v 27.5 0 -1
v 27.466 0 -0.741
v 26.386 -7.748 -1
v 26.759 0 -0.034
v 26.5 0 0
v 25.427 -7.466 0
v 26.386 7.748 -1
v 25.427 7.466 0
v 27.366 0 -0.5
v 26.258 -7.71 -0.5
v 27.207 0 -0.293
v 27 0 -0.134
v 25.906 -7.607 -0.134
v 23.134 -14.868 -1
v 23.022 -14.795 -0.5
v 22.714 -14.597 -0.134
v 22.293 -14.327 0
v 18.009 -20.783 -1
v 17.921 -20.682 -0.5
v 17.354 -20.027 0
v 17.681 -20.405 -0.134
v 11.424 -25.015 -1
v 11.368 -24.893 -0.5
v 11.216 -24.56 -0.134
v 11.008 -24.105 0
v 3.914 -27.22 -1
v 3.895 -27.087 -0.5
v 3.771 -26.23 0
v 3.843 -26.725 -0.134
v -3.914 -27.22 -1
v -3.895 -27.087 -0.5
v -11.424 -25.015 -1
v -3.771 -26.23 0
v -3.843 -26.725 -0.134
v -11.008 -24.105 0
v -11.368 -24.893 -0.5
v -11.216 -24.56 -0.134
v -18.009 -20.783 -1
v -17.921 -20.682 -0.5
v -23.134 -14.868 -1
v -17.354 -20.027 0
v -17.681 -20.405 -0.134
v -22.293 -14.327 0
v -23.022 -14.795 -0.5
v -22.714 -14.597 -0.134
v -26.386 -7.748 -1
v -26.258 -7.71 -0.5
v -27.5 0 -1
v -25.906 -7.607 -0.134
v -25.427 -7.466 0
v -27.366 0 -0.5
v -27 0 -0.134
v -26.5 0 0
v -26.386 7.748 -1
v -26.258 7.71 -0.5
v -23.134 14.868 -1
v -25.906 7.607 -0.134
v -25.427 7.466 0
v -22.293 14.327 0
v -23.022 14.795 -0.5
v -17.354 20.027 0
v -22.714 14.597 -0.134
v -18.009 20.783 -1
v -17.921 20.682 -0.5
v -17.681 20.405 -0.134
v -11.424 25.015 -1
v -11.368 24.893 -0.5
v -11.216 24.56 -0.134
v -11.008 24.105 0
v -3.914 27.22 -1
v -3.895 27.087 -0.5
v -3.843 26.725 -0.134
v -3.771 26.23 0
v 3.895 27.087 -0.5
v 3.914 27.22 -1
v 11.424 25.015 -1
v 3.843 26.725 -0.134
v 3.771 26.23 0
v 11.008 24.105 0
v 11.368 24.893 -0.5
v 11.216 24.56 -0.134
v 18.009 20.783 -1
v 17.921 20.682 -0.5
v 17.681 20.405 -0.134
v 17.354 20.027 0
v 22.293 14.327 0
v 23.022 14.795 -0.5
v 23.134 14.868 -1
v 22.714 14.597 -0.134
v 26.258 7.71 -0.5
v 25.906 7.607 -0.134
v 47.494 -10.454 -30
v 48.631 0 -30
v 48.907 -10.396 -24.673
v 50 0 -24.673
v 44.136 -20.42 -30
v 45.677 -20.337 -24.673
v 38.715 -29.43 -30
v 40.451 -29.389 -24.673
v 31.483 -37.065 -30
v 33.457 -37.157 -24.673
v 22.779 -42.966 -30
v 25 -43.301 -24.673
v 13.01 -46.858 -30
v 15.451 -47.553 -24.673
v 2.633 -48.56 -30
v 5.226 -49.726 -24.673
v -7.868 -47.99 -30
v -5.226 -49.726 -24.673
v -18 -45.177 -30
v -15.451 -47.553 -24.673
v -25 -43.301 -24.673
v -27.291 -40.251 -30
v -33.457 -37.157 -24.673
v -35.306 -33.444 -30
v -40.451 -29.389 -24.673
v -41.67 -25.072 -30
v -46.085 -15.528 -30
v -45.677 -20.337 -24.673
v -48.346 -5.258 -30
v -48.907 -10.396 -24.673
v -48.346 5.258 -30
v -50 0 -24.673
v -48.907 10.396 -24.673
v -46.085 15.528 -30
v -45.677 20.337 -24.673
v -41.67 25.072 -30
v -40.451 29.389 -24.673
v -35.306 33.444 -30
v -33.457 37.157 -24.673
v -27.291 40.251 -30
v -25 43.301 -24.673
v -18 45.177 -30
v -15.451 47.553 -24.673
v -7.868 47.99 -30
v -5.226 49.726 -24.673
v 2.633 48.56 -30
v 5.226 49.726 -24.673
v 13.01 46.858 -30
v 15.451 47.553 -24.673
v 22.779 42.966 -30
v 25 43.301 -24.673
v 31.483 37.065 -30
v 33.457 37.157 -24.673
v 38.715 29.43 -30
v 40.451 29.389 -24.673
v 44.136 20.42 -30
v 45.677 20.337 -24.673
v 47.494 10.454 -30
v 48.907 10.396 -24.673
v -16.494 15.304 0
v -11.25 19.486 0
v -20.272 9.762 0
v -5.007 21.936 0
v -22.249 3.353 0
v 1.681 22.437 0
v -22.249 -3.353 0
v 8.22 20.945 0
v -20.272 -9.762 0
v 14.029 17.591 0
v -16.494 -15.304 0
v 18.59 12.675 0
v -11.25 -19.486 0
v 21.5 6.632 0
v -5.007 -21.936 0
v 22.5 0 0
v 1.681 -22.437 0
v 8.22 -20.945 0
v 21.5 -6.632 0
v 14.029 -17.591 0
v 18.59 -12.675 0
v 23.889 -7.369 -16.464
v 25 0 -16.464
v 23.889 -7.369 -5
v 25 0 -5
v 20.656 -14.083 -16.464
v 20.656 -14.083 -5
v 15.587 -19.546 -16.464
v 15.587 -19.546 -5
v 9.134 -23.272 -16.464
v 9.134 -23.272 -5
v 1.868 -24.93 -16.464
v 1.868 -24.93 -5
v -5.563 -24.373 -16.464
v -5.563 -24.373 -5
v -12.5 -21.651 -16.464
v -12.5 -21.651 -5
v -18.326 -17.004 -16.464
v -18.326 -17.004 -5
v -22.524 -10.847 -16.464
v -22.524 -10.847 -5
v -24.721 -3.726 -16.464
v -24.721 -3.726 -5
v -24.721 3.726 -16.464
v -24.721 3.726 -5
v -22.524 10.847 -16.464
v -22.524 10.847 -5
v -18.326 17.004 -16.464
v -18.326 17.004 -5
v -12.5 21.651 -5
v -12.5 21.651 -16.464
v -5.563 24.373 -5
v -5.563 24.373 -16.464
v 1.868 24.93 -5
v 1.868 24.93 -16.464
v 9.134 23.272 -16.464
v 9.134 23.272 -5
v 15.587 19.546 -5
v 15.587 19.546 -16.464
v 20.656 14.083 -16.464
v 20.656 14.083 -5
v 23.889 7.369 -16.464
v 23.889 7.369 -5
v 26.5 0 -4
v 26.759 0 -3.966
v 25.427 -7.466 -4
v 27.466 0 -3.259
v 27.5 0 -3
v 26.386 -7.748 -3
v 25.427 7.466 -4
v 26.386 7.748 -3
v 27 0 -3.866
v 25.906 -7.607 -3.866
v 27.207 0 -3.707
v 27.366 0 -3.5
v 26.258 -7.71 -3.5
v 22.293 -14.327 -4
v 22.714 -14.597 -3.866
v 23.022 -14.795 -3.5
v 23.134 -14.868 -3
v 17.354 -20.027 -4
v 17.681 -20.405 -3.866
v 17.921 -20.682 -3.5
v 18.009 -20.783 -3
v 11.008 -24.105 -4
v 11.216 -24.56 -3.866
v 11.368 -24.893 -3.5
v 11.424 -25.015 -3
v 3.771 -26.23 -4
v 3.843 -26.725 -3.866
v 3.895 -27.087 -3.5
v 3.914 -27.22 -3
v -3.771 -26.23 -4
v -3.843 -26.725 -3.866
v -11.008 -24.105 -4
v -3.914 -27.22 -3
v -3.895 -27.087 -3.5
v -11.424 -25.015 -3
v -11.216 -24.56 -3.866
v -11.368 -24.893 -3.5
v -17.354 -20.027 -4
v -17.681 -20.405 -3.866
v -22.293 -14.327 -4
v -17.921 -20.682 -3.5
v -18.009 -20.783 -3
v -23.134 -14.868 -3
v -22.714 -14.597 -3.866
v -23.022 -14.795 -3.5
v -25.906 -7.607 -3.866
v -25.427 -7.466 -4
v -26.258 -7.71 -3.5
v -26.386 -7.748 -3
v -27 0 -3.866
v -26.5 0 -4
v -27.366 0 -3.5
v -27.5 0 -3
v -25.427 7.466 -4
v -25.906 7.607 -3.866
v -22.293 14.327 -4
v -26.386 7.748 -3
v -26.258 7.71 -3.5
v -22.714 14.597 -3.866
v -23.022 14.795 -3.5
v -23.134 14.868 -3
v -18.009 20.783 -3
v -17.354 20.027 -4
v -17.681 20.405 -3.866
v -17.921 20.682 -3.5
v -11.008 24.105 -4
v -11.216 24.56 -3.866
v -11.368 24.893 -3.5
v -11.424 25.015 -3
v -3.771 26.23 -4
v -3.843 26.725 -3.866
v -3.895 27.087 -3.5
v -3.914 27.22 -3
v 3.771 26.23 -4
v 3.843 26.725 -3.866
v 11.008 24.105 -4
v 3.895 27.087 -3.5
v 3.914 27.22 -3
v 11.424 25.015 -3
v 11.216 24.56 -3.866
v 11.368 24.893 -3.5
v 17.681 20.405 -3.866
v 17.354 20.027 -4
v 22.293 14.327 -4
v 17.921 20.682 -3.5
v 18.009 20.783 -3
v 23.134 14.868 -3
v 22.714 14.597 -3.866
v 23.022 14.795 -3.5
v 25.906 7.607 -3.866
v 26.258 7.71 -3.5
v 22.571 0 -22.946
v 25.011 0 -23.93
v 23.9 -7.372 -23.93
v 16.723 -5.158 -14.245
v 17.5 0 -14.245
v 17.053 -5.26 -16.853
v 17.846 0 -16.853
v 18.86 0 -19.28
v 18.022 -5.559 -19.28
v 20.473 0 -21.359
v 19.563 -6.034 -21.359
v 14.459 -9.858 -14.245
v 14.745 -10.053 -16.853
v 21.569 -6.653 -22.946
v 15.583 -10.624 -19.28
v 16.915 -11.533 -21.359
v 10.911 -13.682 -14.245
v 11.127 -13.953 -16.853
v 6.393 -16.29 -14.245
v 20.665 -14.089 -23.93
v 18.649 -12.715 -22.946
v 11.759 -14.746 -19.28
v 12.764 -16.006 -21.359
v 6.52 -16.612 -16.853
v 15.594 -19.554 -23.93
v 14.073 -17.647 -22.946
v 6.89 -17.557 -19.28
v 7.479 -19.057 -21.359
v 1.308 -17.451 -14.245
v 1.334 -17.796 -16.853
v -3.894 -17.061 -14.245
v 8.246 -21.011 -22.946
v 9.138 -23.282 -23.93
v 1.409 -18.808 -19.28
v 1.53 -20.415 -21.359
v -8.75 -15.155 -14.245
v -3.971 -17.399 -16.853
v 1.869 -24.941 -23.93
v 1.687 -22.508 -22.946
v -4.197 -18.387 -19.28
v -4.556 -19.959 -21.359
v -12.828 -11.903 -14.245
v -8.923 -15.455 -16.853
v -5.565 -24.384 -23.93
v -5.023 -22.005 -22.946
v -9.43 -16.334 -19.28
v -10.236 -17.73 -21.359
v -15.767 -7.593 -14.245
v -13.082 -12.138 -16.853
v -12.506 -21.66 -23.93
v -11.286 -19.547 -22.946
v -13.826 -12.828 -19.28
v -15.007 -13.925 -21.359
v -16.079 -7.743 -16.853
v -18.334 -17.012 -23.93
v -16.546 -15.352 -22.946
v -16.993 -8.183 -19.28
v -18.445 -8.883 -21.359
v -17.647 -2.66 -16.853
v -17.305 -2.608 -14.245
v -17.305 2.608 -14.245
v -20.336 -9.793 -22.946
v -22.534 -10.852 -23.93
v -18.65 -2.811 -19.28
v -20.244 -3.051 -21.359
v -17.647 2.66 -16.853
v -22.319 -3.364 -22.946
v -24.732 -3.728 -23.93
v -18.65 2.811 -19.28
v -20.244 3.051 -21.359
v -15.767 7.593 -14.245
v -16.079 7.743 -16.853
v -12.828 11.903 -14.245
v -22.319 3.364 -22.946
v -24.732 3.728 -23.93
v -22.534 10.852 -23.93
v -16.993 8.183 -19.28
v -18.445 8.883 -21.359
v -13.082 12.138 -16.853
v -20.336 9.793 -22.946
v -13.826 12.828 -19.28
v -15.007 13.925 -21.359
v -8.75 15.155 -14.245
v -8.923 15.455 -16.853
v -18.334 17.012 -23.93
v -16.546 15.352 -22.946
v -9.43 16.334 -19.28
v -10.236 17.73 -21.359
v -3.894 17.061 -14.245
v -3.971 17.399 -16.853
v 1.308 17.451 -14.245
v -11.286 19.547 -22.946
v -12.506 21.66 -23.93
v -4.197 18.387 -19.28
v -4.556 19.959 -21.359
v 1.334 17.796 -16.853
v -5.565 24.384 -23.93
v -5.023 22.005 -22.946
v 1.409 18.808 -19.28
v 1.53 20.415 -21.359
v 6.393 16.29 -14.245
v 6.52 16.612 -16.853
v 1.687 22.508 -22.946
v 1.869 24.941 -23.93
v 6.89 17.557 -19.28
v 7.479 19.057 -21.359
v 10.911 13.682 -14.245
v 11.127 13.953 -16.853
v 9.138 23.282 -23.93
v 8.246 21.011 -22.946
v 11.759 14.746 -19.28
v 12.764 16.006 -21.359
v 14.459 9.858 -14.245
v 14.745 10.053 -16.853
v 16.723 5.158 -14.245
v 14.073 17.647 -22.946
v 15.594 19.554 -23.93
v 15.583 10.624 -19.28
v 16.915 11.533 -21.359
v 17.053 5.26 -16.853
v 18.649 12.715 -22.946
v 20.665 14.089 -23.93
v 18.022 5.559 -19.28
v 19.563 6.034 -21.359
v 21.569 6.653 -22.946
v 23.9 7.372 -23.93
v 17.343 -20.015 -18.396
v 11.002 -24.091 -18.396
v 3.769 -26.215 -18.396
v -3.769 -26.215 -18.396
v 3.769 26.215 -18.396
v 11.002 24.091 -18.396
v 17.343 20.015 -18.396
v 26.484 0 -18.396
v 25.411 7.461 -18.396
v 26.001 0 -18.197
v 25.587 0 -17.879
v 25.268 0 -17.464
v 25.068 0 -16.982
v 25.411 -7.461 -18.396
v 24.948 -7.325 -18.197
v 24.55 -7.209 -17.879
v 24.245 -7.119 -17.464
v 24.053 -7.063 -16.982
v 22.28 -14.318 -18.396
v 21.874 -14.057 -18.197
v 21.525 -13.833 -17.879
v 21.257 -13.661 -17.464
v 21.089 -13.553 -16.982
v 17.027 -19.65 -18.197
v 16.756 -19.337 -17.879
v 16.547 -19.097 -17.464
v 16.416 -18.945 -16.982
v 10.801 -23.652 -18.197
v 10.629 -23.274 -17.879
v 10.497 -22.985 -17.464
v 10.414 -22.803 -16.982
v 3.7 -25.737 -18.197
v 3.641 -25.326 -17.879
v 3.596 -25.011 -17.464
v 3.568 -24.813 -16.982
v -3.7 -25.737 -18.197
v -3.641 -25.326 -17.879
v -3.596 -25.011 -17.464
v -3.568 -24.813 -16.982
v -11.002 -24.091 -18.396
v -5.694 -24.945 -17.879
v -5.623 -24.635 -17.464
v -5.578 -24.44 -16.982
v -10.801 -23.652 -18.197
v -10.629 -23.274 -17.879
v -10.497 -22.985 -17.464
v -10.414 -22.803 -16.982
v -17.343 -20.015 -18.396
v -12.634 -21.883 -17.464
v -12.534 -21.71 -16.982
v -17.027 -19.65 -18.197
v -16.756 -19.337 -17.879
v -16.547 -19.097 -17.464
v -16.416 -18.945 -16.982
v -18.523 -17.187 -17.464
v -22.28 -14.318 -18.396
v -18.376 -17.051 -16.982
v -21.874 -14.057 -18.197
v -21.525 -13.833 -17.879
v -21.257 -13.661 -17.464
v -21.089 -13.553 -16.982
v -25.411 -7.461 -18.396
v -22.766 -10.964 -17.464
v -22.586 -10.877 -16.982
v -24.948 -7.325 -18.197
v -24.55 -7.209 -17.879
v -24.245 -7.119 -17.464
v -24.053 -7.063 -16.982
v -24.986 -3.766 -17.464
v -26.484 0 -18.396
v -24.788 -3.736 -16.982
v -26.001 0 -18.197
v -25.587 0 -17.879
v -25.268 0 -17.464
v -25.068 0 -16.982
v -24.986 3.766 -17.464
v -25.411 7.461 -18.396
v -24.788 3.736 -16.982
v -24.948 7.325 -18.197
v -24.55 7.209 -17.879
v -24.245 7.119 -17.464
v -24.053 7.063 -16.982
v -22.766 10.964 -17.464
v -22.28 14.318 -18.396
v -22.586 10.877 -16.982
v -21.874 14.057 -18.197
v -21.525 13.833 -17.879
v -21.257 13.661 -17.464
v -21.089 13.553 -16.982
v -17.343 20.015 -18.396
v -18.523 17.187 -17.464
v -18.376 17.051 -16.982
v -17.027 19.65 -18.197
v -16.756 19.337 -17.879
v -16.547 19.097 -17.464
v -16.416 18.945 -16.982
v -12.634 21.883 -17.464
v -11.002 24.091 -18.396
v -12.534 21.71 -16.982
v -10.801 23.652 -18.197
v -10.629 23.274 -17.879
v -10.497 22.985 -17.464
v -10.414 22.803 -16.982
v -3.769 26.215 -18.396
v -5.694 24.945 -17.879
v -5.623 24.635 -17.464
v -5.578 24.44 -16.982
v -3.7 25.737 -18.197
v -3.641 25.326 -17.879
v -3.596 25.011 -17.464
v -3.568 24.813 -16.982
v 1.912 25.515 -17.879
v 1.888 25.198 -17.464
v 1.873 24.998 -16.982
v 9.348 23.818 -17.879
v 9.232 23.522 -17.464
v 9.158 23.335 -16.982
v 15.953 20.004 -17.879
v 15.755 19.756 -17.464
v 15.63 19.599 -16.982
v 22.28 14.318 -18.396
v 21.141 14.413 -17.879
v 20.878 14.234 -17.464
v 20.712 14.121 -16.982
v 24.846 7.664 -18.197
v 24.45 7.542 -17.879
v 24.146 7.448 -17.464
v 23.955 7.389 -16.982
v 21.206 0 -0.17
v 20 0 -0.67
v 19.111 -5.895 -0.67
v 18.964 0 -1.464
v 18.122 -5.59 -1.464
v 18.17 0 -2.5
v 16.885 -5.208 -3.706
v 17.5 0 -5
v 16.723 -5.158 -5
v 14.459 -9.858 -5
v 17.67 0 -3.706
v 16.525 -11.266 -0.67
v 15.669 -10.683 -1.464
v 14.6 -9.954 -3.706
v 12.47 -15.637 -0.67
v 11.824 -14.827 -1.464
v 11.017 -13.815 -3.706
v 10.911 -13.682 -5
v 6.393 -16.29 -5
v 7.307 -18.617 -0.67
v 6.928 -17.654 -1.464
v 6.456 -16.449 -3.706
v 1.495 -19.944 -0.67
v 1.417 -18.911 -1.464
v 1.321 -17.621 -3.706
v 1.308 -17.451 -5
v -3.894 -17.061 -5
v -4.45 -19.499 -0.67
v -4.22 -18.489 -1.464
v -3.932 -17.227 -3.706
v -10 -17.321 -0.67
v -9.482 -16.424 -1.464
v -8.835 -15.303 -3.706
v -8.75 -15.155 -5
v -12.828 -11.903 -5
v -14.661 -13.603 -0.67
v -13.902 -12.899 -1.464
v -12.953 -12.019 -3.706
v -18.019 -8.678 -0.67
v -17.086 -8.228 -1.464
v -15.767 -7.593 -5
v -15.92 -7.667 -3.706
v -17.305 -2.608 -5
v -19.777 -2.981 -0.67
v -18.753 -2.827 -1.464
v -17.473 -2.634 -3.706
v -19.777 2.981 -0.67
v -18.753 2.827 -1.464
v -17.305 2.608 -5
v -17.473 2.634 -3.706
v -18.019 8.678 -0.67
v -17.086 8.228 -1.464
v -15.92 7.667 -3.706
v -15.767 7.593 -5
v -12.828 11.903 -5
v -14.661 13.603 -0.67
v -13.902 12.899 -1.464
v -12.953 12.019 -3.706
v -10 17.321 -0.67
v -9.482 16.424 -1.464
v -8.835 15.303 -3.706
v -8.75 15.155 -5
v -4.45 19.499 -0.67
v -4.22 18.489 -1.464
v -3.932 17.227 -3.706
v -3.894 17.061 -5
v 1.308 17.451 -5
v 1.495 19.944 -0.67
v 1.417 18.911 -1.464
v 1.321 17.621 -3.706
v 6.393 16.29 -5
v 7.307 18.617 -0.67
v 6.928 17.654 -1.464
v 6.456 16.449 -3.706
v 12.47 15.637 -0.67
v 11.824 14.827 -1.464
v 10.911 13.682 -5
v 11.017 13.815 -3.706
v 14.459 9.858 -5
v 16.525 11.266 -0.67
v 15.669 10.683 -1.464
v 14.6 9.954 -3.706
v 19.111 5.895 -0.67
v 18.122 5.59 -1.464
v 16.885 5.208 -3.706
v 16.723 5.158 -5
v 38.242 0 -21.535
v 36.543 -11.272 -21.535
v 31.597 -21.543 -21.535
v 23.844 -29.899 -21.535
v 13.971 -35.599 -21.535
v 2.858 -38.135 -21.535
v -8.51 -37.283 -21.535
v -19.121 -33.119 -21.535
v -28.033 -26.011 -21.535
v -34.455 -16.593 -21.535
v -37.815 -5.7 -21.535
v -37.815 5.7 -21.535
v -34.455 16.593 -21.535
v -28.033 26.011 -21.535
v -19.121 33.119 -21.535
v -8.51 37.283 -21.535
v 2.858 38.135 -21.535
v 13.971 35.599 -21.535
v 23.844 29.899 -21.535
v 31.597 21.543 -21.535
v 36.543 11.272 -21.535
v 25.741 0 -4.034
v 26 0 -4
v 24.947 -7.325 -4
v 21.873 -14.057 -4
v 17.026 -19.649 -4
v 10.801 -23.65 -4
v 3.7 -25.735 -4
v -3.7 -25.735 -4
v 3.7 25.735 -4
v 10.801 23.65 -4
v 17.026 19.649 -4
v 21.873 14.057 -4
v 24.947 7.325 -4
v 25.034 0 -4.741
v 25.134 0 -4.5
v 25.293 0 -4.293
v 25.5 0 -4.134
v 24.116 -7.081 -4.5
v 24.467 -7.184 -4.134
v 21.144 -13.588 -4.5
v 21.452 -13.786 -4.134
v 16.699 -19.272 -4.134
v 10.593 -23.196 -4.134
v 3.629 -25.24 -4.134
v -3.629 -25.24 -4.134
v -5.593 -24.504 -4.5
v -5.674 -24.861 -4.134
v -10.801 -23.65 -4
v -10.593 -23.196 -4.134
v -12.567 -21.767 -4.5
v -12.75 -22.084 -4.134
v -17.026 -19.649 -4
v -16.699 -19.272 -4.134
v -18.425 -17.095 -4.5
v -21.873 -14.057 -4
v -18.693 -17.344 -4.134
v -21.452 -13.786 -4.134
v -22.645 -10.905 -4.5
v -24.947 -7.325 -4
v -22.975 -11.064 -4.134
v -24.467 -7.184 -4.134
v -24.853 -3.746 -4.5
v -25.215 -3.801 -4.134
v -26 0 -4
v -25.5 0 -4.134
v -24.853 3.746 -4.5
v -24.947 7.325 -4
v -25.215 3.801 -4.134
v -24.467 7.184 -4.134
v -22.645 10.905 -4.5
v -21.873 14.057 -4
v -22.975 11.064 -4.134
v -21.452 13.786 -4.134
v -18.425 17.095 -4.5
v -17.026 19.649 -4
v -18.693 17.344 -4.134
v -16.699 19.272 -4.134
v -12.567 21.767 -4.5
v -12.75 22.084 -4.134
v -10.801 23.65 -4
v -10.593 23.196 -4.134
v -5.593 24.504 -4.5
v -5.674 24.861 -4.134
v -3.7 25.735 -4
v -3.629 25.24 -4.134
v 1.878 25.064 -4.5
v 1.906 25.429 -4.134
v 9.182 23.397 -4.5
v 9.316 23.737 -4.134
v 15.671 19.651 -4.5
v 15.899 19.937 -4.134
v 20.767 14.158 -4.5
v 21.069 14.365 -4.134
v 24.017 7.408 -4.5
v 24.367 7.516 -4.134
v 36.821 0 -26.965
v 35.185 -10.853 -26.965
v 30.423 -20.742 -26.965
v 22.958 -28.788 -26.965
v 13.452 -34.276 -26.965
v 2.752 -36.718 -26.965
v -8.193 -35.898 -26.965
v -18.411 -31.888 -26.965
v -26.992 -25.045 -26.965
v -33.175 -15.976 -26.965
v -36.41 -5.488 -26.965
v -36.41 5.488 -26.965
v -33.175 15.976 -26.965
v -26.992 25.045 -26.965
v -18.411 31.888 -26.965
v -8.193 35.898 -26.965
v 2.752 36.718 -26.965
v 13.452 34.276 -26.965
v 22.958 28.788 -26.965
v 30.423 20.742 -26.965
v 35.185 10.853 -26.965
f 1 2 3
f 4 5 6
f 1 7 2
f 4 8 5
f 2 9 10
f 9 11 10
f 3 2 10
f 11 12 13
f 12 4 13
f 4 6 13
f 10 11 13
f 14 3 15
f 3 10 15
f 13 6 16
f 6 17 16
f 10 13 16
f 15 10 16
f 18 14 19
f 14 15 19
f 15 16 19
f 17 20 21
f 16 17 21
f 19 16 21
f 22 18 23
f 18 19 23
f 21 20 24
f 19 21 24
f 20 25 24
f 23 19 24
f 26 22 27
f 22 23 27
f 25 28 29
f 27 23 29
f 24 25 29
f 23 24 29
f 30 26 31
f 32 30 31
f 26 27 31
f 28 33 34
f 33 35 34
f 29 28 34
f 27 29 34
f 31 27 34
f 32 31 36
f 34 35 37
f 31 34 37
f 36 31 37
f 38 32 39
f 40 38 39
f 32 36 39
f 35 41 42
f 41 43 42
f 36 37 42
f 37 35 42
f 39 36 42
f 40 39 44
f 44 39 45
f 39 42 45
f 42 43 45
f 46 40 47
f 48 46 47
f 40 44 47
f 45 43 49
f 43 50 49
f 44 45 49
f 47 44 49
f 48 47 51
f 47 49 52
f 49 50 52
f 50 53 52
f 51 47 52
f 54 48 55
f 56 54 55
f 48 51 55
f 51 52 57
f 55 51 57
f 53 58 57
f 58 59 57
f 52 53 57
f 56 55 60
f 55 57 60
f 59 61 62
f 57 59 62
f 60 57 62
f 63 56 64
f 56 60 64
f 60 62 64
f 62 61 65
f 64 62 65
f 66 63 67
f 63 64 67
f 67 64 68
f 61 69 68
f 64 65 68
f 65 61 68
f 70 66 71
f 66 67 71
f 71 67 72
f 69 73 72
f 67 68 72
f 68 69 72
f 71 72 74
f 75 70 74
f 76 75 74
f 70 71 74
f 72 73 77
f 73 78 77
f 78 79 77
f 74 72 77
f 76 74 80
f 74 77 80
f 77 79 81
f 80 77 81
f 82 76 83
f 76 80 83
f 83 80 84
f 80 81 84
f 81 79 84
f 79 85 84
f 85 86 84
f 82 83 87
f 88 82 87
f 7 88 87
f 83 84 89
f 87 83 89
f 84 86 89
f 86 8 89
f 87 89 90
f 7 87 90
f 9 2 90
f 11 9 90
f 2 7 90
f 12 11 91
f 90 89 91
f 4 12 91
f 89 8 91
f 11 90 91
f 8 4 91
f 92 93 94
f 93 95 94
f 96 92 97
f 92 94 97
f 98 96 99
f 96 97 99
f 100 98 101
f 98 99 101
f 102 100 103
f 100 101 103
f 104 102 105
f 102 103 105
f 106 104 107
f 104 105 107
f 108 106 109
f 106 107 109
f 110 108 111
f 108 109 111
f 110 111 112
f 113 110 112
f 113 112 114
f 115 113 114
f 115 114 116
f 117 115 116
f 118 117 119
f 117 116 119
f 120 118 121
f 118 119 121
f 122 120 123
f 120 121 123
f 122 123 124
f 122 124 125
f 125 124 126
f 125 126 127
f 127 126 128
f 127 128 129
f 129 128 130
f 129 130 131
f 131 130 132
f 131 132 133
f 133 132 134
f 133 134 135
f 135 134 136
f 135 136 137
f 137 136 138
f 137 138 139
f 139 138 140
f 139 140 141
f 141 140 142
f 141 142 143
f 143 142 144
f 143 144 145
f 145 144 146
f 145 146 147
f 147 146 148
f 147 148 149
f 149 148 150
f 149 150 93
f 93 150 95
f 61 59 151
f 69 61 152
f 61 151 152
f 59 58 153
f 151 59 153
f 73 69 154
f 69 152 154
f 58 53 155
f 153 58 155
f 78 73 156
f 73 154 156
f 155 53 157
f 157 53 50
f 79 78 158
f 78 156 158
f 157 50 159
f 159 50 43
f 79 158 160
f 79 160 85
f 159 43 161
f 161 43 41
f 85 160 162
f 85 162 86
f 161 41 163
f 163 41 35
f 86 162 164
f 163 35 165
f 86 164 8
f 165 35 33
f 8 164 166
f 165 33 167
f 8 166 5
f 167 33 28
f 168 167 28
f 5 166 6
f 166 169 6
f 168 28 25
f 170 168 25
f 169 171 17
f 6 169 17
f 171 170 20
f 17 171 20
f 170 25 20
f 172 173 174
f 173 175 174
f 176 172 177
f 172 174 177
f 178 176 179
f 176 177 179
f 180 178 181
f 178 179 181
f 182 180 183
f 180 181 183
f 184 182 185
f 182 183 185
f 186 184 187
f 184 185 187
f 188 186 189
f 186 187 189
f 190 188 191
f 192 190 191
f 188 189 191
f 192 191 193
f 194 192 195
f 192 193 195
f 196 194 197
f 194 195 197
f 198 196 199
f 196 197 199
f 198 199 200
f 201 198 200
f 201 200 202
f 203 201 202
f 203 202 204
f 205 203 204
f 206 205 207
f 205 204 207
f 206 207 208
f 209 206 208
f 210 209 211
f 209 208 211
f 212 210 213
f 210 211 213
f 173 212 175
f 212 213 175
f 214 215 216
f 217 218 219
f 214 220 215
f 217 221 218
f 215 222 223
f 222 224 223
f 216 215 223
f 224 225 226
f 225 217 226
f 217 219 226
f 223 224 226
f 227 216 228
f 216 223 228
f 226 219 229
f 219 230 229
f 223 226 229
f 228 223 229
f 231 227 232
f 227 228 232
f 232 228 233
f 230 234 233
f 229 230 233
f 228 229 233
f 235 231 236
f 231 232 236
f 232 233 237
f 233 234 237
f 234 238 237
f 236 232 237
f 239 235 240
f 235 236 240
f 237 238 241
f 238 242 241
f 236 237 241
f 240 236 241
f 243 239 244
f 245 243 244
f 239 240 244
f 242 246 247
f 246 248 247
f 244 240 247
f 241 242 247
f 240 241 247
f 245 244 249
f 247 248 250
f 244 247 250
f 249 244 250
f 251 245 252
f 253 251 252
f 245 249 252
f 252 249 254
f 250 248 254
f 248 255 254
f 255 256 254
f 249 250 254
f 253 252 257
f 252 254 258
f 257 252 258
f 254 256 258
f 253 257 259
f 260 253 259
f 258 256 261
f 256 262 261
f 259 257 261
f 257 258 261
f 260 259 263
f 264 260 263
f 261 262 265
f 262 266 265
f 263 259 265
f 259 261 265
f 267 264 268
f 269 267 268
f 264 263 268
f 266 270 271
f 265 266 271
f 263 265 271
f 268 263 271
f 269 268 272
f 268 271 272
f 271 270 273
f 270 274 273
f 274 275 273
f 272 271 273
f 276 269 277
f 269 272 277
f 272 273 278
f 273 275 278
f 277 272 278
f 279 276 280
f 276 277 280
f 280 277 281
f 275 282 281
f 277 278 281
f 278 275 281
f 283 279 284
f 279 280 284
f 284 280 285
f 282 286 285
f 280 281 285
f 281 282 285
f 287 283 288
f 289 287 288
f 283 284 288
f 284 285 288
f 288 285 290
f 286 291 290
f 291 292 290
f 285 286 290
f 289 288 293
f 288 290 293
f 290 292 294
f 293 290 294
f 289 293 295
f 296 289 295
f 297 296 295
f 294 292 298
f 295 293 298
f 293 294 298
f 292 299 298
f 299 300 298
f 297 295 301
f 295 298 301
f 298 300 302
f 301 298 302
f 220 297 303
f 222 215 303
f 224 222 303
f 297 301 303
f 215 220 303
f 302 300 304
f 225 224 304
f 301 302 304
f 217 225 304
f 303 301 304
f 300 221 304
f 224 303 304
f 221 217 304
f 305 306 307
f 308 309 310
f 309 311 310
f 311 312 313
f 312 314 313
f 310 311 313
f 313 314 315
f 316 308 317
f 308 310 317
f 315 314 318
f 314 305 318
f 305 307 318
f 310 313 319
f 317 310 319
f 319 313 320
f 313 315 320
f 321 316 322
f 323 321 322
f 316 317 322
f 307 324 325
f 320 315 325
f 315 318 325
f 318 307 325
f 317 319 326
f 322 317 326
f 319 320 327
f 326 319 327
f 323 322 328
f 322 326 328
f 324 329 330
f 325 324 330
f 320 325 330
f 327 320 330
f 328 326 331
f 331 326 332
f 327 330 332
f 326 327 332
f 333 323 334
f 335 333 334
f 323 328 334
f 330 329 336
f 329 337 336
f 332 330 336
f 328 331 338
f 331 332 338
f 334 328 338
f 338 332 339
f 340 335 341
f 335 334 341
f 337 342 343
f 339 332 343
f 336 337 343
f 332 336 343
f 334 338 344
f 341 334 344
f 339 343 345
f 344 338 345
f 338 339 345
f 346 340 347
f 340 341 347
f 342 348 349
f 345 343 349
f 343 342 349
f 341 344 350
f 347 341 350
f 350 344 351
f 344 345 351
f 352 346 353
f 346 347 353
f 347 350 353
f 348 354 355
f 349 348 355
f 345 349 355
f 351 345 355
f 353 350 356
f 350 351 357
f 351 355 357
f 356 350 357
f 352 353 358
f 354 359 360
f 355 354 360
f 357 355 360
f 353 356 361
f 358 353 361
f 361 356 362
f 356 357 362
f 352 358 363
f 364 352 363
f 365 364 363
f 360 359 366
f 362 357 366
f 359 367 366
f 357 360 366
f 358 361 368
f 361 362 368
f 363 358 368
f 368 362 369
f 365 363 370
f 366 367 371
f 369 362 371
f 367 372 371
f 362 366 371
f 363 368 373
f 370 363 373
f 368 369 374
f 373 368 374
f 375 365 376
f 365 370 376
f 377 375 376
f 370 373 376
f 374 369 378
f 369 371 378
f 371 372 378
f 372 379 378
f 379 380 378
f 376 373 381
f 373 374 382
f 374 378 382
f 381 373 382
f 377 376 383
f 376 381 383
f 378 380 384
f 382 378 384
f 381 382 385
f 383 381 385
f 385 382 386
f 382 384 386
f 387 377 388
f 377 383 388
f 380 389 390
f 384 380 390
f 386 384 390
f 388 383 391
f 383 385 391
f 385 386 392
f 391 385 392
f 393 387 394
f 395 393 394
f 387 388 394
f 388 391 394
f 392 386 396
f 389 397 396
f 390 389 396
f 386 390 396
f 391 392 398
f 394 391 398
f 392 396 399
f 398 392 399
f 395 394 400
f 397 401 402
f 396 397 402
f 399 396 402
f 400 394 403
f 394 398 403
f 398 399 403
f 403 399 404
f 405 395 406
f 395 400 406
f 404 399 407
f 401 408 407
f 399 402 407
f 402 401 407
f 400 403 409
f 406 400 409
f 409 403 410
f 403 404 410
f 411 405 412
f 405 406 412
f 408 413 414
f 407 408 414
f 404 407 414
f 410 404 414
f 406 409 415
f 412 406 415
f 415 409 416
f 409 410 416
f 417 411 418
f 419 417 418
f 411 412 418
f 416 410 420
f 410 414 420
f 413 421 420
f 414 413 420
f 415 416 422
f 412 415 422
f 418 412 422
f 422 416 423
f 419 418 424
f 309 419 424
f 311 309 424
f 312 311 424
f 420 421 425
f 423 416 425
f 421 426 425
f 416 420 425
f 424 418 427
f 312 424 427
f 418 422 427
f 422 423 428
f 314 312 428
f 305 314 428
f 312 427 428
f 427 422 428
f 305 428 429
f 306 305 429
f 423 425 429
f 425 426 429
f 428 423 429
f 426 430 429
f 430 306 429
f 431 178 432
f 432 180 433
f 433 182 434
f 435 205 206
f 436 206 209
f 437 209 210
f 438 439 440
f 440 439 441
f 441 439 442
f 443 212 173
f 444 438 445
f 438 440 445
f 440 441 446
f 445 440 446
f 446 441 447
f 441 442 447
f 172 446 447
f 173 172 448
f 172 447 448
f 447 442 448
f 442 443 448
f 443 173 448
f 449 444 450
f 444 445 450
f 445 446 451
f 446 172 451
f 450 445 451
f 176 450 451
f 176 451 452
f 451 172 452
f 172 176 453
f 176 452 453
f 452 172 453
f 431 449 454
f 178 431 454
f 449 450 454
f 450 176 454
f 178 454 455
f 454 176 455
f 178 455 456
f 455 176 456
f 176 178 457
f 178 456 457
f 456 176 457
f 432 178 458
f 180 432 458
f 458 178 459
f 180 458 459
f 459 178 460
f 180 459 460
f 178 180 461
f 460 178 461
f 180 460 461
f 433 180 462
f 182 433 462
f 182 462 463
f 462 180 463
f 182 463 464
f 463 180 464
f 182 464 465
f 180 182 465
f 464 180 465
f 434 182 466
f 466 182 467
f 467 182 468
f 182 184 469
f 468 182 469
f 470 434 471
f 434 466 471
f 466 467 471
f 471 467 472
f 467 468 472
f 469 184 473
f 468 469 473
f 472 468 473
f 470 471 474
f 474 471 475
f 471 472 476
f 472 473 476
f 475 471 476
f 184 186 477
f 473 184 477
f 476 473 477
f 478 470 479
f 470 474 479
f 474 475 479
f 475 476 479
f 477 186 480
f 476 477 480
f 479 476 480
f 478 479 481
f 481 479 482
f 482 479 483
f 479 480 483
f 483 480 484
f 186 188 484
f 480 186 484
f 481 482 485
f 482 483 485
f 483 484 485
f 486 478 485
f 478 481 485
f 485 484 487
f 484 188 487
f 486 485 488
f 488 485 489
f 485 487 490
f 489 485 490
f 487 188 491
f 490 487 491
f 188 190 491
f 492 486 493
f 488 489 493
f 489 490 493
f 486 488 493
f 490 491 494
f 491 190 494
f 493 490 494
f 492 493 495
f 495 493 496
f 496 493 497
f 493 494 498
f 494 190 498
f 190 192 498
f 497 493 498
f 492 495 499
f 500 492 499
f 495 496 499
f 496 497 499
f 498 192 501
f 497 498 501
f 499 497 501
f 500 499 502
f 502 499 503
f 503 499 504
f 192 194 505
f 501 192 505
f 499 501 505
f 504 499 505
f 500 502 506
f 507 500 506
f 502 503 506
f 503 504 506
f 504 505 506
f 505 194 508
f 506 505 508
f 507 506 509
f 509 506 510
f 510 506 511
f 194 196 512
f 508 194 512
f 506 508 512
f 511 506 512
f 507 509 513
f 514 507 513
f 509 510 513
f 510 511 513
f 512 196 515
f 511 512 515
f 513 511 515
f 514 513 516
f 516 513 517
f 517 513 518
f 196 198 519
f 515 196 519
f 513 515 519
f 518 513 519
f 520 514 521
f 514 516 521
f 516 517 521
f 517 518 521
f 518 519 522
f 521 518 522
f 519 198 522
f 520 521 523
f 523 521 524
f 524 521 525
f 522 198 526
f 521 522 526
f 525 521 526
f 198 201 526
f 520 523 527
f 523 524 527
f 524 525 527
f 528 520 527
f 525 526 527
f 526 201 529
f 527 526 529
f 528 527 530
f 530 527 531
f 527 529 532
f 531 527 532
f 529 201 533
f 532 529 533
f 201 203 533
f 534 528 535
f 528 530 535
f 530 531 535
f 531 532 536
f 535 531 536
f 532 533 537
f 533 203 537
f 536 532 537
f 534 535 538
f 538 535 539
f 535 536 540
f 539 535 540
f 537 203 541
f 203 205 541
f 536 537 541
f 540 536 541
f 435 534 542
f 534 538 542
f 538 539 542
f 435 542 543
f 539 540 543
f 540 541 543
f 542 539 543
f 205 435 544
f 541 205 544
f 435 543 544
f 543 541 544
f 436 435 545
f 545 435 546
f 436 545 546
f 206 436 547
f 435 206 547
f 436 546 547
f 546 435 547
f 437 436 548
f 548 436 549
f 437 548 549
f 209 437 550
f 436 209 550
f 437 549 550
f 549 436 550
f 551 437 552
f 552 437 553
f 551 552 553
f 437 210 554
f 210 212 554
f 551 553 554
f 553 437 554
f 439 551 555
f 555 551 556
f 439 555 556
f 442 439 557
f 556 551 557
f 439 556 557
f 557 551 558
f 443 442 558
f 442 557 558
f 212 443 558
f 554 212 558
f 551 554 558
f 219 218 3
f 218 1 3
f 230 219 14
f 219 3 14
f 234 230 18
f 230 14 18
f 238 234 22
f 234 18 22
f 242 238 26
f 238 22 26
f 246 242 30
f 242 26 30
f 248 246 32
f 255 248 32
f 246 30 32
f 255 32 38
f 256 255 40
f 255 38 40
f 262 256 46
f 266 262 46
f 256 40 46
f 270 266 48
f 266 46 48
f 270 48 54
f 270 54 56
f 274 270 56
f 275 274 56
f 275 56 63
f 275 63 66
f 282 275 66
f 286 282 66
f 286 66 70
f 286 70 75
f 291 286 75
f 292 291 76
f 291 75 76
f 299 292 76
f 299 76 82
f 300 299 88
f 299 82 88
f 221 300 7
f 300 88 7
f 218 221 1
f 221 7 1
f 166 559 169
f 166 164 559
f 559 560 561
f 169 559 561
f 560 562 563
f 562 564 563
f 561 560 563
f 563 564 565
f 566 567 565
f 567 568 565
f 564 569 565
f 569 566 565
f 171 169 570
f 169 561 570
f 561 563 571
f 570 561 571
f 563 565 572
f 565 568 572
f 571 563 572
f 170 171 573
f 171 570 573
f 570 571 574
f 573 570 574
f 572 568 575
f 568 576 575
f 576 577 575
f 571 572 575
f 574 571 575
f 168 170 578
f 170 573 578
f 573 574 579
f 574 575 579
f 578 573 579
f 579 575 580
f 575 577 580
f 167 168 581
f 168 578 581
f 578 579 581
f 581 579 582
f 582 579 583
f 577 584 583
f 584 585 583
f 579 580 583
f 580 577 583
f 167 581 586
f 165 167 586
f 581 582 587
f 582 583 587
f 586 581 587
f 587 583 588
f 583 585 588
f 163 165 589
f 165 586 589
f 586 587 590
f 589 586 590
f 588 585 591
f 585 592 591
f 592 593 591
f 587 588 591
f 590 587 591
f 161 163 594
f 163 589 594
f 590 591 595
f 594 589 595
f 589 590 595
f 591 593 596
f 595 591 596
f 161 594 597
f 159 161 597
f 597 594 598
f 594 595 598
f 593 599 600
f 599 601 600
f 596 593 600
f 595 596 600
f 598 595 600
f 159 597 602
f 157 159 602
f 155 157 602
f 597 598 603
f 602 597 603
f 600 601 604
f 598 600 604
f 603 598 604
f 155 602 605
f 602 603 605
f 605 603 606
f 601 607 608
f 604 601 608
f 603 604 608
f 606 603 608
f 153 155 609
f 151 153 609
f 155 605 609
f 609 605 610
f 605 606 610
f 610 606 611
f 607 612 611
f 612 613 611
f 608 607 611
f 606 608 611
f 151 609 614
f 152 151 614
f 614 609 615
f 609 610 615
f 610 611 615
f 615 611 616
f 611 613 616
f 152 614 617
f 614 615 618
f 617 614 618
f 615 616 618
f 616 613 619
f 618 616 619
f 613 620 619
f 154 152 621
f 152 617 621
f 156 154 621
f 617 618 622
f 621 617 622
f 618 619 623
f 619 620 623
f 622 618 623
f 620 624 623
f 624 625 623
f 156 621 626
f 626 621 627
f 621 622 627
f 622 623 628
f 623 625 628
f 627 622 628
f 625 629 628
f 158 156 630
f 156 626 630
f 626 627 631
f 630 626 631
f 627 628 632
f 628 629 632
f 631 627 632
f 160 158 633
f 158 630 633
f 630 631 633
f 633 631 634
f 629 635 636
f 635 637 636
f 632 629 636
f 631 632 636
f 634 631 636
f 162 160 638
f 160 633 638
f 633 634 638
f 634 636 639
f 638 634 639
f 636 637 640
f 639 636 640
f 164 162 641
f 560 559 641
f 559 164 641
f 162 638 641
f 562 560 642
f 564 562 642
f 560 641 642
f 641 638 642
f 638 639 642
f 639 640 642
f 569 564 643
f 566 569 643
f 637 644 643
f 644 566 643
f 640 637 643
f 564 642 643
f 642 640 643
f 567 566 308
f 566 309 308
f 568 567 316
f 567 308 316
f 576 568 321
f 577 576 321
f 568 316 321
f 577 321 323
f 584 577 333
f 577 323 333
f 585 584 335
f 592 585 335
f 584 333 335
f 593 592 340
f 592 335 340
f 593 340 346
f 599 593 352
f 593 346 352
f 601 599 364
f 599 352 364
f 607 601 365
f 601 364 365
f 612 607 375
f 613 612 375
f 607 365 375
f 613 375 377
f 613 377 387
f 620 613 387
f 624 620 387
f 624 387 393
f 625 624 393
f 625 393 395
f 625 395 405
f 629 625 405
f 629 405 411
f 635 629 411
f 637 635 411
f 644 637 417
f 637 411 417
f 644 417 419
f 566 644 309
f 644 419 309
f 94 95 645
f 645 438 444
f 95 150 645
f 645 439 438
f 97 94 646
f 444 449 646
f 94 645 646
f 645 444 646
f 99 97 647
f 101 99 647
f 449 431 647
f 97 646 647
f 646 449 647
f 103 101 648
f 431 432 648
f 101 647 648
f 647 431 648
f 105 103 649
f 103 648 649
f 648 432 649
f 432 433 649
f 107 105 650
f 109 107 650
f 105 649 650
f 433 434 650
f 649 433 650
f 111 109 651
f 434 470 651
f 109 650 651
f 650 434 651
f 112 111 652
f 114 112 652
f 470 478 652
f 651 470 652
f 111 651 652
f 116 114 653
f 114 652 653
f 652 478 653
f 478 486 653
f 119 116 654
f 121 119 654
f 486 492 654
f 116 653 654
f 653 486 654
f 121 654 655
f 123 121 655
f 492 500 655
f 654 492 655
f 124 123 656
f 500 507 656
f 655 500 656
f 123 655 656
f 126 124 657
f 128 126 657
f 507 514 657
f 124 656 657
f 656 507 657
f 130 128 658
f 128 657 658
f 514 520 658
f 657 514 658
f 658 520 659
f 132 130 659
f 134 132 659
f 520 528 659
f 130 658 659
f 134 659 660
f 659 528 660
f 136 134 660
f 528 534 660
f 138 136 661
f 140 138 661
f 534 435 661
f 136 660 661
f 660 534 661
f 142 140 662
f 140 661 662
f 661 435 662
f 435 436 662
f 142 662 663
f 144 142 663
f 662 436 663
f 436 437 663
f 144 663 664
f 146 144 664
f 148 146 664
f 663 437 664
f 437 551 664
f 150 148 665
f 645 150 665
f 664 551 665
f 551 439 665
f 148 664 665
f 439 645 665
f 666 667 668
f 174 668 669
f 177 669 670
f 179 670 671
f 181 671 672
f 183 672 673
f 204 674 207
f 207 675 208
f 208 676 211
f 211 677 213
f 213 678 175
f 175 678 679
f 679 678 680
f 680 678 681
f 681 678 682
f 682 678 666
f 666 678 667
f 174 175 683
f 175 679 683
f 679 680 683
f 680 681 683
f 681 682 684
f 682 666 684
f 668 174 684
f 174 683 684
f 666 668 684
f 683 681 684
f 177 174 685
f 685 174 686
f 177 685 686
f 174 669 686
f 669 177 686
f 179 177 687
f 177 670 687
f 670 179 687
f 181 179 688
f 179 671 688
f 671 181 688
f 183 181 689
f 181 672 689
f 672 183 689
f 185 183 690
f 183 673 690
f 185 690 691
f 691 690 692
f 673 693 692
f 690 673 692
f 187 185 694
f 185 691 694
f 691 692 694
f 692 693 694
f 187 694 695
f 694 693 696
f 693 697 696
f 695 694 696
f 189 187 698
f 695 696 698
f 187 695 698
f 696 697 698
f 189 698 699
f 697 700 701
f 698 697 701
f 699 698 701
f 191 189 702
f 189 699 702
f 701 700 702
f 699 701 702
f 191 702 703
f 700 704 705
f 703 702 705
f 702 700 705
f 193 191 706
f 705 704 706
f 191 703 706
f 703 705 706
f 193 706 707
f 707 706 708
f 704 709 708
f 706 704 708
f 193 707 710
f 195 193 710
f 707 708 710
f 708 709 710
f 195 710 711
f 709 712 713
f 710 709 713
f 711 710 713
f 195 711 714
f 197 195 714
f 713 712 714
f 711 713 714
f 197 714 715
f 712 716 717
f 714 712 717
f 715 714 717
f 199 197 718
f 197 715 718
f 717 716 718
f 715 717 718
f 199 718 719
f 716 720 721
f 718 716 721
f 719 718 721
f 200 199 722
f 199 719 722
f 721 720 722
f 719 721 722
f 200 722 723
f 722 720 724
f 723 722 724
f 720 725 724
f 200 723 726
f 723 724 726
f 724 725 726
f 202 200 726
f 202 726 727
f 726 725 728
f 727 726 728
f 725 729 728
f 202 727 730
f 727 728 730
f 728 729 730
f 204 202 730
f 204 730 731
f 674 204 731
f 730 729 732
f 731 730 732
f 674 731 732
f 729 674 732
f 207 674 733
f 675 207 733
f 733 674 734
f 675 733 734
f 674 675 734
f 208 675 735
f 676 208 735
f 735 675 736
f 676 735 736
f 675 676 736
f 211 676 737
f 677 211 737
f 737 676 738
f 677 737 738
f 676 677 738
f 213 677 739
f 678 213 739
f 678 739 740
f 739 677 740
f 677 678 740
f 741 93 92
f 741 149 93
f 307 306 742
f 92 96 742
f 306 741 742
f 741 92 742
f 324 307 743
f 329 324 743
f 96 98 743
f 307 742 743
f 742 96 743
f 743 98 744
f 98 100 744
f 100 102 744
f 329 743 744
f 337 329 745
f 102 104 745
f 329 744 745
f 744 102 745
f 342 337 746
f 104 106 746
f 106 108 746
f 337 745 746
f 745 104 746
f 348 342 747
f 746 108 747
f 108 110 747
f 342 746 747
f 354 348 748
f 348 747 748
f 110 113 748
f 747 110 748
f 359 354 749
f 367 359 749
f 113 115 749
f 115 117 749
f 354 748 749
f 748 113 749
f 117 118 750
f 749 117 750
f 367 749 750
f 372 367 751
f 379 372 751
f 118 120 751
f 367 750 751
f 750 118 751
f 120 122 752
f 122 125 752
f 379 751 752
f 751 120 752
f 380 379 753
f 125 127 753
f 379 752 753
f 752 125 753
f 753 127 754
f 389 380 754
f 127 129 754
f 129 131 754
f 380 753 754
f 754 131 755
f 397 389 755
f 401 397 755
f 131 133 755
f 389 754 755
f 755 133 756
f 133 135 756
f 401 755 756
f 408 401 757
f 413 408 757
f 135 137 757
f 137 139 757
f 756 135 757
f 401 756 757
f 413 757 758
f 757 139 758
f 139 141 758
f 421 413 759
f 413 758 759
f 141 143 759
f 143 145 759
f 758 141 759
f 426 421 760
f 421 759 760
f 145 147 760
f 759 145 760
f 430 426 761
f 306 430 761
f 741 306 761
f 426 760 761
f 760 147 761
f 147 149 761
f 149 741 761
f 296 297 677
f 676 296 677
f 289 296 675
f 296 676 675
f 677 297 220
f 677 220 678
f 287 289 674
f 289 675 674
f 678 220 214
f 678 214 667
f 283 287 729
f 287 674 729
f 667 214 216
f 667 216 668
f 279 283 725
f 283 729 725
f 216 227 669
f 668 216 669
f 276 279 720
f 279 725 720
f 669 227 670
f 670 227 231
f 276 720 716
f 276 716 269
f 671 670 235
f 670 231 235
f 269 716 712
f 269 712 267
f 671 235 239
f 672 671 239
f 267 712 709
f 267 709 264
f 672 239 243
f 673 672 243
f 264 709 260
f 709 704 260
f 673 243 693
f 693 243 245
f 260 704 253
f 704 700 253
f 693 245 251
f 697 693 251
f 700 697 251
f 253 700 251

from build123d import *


with BuildPart() as part:
    # Sketch1 → Revolve1 (revolve)
    with BuildSketch(Plane(origin=(0, 0, 0), x_dir=(0, 0, -1), z_dir=(1, 0, 0)), mode=Mode.PRIVATE) as revolve1_sk:
        with BuildLine():
            Line((0, 26.5), (0, 22.5))
            ThreePointArc((0, 22.5), (1.464466094, 18.964466094), (5, 17.5))
            Line((5, 17.5), (14.244868029, 17.5))
            ThreePointArc((14.244868029, 17.5), (20.373117991, 19.597813442), (23.930182924, 25.011089519))
            Line((23.930182924, 25.011089519), (30, 48.631099236))
            Line((30, 48.631099236), (24.673076808, 50))
            Line((24.673076808, 50), (18.396170465, 26.484212143))
            ThreePointArc((18.396170465, 26.484212143), (17.68210645, 25.413876469), (16.463823993, 25))
            Line((16.463823993, 25), (5, 25))
            ThreePointArc((5, 25), (4.292893219, 25.292893219), (4, 26))
            Line((4, 26), (4, 26.5))
            ThreePointArc((4, 26.5), (3.707106781, 27.207106781), (3, 27.5))
            Line((3, 27.5), (1, 27.5))
            ThreePointArc((1, 27.5), (0.292893219, 27.207106781), (0, 26.5))
        make_face()
    revolve(revolve1_sk.sketch.rotate(Axis((0, 0, 0), (0, 0, -1)), 90), axis=Axis((0, 0, 0), (0, 0, -1)))


solid = part.part
